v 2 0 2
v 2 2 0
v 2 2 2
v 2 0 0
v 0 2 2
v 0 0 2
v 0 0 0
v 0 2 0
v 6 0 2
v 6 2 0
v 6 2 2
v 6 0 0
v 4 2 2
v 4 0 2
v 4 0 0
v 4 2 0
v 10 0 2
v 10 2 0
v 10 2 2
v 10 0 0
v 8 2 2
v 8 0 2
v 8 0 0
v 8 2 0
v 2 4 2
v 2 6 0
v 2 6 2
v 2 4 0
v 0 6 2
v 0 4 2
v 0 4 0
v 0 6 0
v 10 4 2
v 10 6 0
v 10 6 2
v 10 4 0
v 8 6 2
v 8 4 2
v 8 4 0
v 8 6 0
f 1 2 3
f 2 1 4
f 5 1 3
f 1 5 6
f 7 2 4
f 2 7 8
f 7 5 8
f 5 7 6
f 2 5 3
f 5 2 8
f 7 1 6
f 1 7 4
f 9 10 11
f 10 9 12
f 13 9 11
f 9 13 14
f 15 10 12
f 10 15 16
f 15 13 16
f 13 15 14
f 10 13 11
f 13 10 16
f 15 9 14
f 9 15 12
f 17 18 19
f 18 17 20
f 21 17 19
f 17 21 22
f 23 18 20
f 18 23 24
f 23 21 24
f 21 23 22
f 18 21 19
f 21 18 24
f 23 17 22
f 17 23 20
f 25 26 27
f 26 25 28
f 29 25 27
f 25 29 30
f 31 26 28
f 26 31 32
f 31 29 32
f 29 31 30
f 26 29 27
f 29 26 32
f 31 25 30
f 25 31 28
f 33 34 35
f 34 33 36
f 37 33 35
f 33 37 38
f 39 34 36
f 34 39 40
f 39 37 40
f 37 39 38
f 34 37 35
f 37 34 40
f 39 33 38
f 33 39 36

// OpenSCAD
union() {
	translate([0, 0, 0]) cube(size=[2,2,2], center=false);
	translate([4, 0, 0]) cube(size=[2,2,2], center=false);
	translate([8, 0, 0]) cube(size=[2,2,2], center=false);
	translate([0, 4, 0]) cube(size=[2,2,2], center=false);
	translate([8, 4, 0]) cube(size=[2,2,2], center=false);
}
